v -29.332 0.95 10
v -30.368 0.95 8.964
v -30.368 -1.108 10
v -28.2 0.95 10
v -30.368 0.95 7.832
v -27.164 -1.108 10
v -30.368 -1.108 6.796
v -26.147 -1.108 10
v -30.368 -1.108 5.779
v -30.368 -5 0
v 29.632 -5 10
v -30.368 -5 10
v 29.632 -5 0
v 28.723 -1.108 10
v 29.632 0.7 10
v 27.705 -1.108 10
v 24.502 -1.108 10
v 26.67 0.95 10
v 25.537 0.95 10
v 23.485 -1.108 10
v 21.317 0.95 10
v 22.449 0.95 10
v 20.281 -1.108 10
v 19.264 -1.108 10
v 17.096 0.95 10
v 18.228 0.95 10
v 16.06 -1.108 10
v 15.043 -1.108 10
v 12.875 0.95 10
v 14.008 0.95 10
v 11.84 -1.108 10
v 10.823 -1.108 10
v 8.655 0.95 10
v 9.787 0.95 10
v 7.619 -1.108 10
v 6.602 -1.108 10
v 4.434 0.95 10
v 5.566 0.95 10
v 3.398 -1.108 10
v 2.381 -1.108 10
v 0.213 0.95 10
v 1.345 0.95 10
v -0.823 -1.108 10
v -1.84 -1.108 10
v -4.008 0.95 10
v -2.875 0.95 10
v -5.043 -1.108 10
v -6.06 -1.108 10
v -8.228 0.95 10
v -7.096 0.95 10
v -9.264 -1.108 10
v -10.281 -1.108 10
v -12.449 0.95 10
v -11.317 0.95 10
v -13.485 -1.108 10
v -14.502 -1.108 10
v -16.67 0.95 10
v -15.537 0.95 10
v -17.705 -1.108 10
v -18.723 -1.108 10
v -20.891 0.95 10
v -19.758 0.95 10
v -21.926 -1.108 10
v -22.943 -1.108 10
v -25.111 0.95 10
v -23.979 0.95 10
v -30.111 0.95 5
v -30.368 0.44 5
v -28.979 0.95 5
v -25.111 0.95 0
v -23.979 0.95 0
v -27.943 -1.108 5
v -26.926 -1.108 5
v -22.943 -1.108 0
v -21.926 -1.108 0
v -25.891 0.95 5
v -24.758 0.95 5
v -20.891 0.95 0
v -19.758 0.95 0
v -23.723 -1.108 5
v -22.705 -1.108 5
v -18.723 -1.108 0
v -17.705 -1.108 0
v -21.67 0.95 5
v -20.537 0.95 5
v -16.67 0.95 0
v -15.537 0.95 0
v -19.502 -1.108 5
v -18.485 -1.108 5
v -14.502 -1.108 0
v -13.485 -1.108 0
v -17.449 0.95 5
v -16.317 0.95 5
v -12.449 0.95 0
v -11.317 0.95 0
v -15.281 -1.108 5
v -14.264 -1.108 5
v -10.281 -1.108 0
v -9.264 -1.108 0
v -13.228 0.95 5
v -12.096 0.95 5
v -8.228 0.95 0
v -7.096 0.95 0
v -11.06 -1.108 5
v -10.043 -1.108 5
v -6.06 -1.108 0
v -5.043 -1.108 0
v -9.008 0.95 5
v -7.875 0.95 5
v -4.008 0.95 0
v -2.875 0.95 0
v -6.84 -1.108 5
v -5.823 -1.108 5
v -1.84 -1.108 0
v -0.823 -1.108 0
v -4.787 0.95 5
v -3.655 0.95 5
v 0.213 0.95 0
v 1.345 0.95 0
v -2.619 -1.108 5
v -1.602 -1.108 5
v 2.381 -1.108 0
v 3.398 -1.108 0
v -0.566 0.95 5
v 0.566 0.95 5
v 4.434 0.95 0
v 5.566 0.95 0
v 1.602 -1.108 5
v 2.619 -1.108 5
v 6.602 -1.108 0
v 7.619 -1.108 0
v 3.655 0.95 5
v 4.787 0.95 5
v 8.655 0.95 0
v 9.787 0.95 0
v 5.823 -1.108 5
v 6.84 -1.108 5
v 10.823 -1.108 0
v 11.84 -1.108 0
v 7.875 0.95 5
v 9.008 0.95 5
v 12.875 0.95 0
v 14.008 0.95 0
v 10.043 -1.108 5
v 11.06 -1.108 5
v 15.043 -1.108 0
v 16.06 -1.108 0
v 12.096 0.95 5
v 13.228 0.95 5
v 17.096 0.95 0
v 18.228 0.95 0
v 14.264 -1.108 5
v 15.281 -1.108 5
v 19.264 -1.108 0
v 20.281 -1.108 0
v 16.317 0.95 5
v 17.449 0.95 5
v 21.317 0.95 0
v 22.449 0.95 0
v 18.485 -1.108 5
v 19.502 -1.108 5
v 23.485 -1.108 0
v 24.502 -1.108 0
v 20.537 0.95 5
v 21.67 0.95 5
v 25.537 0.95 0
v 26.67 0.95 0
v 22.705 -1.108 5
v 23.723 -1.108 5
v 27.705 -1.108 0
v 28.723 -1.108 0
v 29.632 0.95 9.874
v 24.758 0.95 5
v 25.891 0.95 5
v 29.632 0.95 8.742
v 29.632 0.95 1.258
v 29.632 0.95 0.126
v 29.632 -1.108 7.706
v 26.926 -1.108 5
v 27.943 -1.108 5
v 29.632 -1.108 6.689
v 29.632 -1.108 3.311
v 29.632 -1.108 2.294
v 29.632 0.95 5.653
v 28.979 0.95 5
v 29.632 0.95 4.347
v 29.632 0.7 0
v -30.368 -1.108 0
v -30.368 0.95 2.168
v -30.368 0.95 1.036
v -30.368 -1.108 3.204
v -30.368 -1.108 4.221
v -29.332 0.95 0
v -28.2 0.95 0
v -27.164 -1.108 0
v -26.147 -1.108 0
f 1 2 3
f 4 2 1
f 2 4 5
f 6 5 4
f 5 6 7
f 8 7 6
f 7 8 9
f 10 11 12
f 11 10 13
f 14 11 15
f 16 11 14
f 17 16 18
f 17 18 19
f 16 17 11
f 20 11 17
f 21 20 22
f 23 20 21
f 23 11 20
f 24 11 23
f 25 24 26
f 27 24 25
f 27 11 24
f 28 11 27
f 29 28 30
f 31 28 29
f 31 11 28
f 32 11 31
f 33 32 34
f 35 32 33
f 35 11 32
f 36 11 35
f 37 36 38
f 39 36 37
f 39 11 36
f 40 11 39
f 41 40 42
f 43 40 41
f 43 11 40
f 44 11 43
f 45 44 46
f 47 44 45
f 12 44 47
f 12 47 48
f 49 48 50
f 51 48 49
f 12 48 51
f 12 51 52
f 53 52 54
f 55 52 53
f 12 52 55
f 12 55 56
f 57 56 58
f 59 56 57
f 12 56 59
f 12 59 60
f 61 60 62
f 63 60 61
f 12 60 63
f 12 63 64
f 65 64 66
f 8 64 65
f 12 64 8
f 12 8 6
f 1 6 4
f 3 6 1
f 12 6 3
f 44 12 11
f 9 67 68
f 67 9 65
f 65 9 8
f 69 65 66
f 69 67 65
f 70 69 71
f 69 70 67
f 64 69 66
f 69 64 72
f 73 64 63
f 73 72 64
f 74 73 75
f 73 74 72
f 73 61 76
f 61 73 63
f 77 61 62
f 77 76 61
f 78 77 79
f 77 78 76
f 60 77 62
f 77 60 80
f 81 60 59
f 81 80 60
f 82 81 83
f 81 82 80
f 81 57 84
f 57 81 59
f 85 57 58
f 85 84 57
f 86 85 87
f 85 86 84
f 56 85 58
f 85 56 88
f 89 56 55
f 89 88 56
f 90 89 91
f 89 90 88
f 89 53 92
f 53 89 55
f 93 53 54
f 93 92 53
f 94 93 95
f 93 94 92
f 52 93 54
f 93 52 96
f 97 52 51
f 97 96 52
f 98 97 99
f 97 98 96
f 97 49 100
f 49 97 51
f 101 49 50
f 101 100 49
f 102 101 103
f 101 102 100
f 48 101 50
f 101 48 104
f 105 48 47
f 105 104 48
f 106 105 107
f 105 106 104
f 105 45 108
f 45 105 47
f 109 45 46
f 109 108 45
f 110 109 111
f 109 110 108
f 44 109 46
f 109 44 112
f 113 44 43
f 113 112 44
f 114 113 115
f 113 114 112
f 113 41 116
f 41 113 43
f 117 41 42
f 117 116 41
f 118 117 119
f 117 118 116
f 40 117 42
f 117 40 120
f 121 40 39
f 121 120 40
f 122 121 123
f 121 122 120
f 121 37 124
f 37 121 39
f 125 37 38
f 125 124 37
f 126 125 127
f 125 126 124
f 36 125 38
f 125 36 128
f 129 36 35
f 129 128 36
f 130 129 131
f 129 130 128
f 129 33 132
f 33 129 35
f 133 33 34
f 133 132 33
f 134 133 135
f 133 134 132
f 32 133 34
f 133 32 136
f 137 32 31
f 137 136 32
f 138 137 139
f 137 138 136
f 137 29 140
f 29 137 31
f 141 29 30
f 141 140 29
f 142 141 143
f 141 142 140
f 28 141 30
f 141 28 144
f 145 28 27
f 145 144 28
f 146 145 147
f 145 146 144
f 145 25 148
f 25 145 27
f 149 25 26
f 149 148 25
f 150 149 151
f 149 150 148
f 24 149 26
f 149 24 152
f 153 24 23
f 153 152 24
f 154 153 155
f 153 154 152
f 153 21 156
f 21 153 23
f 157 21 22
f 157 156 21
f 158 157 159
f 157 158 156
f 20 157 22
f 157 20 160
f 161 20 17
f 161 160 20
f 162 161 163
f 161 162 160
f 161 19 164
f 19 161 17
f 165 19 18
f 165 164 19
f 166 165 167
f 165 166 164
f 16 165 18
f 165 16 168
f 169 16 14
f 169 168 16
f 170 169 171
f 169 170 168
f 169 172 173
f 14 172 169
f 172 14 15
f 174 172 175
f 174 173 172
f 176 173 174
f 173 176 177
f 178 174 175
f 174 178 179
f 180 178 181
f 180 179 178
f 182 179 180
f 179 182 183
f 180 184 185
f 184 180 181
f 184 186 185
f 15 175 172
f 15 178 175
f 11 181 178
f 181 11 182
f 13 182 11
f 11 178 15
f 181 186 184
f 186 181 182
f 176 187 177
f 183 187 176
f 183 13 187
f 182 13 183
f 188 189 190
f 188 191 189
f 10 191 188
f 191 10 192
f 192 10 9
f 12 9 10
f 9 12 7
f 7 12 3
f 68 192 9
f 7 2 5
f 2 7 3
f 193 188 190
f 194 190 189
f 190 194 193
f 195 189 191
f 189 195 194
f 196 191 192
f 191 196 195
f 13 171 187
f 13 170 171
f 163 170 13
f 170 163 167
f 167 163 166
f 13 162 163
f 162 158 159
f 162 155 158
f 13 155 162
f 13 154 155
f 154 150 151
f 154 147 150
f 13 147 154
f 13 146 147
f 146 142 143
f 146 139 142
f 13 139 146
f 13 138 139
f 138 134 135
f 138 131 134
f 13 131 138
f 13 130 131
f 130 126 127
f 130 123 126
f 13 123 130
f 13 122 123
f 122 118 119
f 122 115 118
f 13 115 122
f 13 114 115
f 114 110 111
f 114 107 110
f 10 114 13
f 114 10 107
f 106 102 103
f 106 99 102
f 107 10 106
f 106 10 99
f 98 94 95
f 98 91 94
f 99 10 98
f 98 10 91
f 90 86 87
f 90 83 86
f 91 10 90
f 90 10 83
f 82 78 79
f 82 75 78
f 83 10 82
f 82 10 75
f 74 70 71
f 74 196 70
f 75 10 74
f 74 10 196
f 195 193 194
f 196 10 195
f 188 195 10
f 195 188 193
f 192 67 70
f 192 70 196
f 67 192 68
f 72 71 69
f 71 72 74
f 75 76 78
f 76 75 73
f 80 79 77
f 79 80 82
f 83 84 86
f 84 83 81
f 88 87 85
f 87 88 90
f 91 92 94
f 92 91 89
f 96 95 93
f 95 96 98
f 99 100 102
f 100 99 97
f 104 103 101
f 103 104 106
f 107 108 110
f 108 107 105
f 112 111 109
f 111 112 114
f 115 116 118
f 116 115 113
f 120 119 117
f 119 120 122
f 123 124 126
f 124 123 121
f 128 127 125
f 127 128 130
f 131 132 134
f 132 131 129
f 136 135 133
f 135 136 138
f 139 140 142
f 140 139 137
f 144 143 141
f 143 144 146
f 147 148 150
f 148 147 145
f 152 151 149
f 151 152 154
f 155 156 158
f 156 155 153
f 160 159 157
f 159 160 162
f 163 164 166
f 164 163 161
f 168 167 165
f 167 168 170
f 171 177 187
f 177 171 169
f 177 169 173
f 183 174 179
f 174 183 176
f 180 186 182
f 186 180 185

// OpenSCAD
$fn = 96;

/* Library for Involute Gears, Screws and Racks

This library contains the following modules
- rack(modul, length, height, width, pressure_angle=20, helix_angle=0)
- spur_gear(modul, tooth_number, width, bore, pressure_angle=20, helix_angle=0, optimized=true)
- herringbone_gear(modul, tooth_number, width, bore, pressure_angle=20, helix_angle=0, optimized=true)
- rack_and_pinion (modul, rack_length, gear_teeth, rack_height, gear_bore, width, pressure_angle=20, helix_angle=0, together_built=true, optimized=true)
- ring_gear(modul, tooth_number, width, rim_width, pressure_angle=20, helix_angle=0)
- herringbone_ring_gear(modul, tooth_number, width, rim_width, pressure_angle=20, helix_angle=0)
- planetary_gear(modul, sun_teeth, planet_teeth, number_planets, width, rim_width, bore, pressure_angle=20, helix_angle=0, together_built=true, optimized=true)
- bevel_gear(modul, tooth_number,  partial_cone_angle, tooth_width, bore, pressure_angle=20, helix_angle=0)
- bevel_herringbone_gear(modul, tooth_number, partial_cone_angle, tooth_width, bore, pressure_angle=20, helix_angle=0)
- bevel_gear_pair(modul, gear_teeth, pinion_teeth, axis_angle=90, tooth_width, bore, pressure_angle = 20, helix_angle=0, together_built=true)
- bevel_herringbone_gear_pair(modul, gear_teeth, pinion_teeth, axis_angle=90, tooth_width, bore, pressure_angle = 20, helix_angle=0, together_built=true)
- worm(modul, thread_starts, length, bore, pressure_angle=20, lead_angle=10, together_built=true)
- worm_gear(modul, tooth_number, thread_starts, width, length, worm_bore, gear_bore, pressure_angle=20, lead_angle=0, optimized=true, together_built=true)

Examples of each module are commented out at the end of this file

Author:      Dr Jörg Janssen
Last Verified On:      1. June 2018
Version:    2.2
License:     Creative Commons - Attribution, Non Commercial, Share Alike

Permitted modules according to DIN 780:
0.05 0.06 0.08 0.10 0.12 0.16
0.20 0.25 0.3  0.4  0.5  0.6
0.7  0.8  0.9  1    1.25 1.5
2    2.5  3    4    5    6
8    10   12   16   20   25
32   40   50   60

*/


// General Variables
pi = 3.14159;
rad = 57.29578;
clearance = 0.05;   // clearance between teeth

/*  Converts Radians to Degrees */
function grad(pressure_angle) = pressure_angle*rad;

/*  Converts Degrees to Radians */
function radian(pressure_angle) = pressure_angle/rad;

/*  Converts 2D Polar Coordinates to Cartesian
    Format: radius, phi; phi = Angle to x-Axis on xy-Plane */
function polar_to_cartesian(polvect) = [
    polvect[0]*cos(polvect[1]),  
    polvect[0]*sin(polvect[1])
];

/*  Circle Involutes-Function:
    Returns the Polar Coordinates of an Involute Circle
    r = Radius of the Base Circle
    rho = Rolling-angle in Degrees */
function ev(r,rho) = [
    r/cos(rho),
    grad(tan(rho)-radian(rho))
];

/*  Sphere-Involutes-Function
    Returns the Azimuth Angle of an Involute Sphere
    theta0 = Polar Angle of the Cone, where the Cutting Edge of the Large Sphere unrolls the Involute
    theta = Polar Angle for which the Azimuth Angle of the Involute is to be calculated */
function sphere_ev(theta0,theta) = 1/sin(theta0)*acos(cos(theta)/cos(theta0))-acos(tan(theta0)/tan(theta));

/*  Converts Spherical Coordinates to Cartesian
    Format: radius, theta, phi; theta = Angle to z-Axis, phi = Angle to x-Axis on xy-Plane */
function sphere_to_cartesian(vect) = [
    vect[0]*sin(vect[1])*cos(vect[2]),  
    vect[0]*sin(vect[1])*sin(vect[2]),
    vect[0]*cos(vect[1])
];

/*  Check if a Number is even
    = 1, if so
    = 0, if the Number is not even */
function is_even(number) =
    (number == floor(number/2)*2) ? 1 : 0;

/*  greatest common Divisor
    according to Euclidean Algorithm.
    Sorting: a must be greater than b */
function ggt(a,b) = 
    a%b == 0 ? b : ggt(b,a%b);

/*  Polar function with polar angle and two variables */
function spiral(a, r0, phi) =
    a*phi + r0; 

/*  Copy and rotate a Body */
module copier(vect, number, distance, winkel){
    for(i = [0:number-1]){
        translate(v=vect*distance*i)
            rotate(a=i*winkel, v = [0,0,1])
                children(0);
    }
}

/*  rack
    modul = Height of the Tooth Tip above the Rolling LIne
    length = Length of the Rack
    height = Height of the Rack to the Pitch Line
    width = Width of a Tooth
    pressure_angle = Pressure Angle, Standard = 20° according to DIN 867. Should not exceed 45°.
    helix_angle = Helix Angle of the Rack Transverse Axis; 0° = Spur Teeth */
module rack(modul, length, height, width, pressure_angle = 20, helix_angle = 0) {

    // Dimension Calculations
    modul=modul*(1-clearance);
    c = modul / 6;                                              // Tip Clearance
    mx = modul/cos(helix_angle);                          // Module Shift by Helix Angle in the X-Direction
    a = 2*mx*tan(pressure_angle)+c*tan(pressure_angle);       // Flank Width
    b = pi*mx/2-2*mx*tan(pressure_angle);                      // Tip Width
    x = width*tan(helix_angle);                          // Topside Shift by Helix Angle in the X-Direction
    nz = ceil((length+abs(2*x))/(pi*mx));                       // Number of Teeth
    
    translate([-pi*mx*(nz-1)/2-a-b/2,-modul,0]){
        intersection(){                                         // Creates a Prism that fits into a Geometric Box
            copier([1,0,0], nz, pi*mx, 0){
                polyhedron(
                    points=[[0,-c,0], [a,2*modul,0], [a+b,2*modul,0], [2*a+b,-c,0], [pi*mx,-c,0], [pi*mx,modul-height,0], [0,modul-height,0], // Underside
                        [0+x,-c,width], [a+x,2*modul,width], [a+b+x,2*modul,width], [2*a+b+x,-c,width], [pi*mx+x,-c,width], [pi*mx+x,modul-height,width], [0+x,modul-height,width]],   // Topside
                    faces=[[6,5,4,3,2,1,0],                     // Underside
                        [1,8,7,0],
                        [9,8,1,2],
                        [10,9,2,3],
                        [11,10,3,4],
                        [12,11,4,5],
                        [13,12,5,6],
                        [7,13,6,0],
                        [7,8,9,10,11,12,13],                    // Topside
                    ]
                );
            };
            translate([abs(x),-height+modul-0.5,-0.5]){
                cube([length,height+modul+1,width+1]);          // Cuboid which includes the Volume of the Rack
            }   
        };
    };  
}

/*  Spur gear
    modul = Height of the Tooth Tip beyond the Pitch Circle
    tooth_number = Number of Gear Teeth
    width = tooth_width
    bore = Diameter of the Center Hole
    pressure_angle = Pressure Angle, Standard = 20° according to DIN 867. Should not exceed 45°.
    helix_angle = Helix Angle to the Axis of Rotation; 0° = Spur Teeth
    optimized = Create holes for Material-/Weight-Saving or Surface Enhancements where Geometry allows */
module spur_gear(modul, tooth_number, width, bore, pressure_angle = 20, helix_angle = 0, optimized = true) {

    // Dimension Calculations  
    d = modul * tooth_number;                                           // Pitch Circle Diameter
    r = d / 2;                                                      // Pitch Circle Radius
    alpha_spur = atan(tan(pressure_angle)/cos(helix_angle));// Helix Angle in Transverse Section
    db = d * cos(alpha_spur);                                      // Base Circle Diameter
    rb = db / 2;                                                    // Base Circle Radius
    da = (modul <1)? d + modul * 2.2 : d + modul * 2;               // Tip Diameter according to DIN 58400 or DIN 867
    ra = da / 2;                                                    // Tip Circle Radius
    c =  (tooth_number <3)? 0 : modul/6;                                // Tip Clearance
    df = d - 2 * (modul + c);                                       // Root Circle Diameter
    rf = df / 2;                                                    // Root Radius
    rho_ra = acos(rb/ra);                                           // Maximum Rolling Angle;
                                                                    // Involute begins on the Base Circle and ends at the Tip Circle
    rho_r = acos(rb/r);                                             // Rolling Angle at Pitch Circle;
                                                                    // Involute begins on the Base Circle and ends at the Tip Circle
    phi_r = grad(tan(rho_r)-radian(rho_r));                         // Angle to Point of Involute on Pitch Circle
    gamma = rad*width/(r*tan(90-helix_angle));               // Torsion Angle for Extrusion
    step = rho_ra/16;                                            // Involute is divided into 16 pieces
    tau = 360/tooth_number;                                             // Pitch Angle
    
    r_hole = (2*rf - bore)/8;                                    // Radius of Holes for Material-/Weight-Saving
    rm = bore/2+2*r_hole;                                        // Distance of the Axes of the Holes from the Main Axis
    z_hole = floor(2*pi*rm/(3*r_hole));                             // Number of Holes for Material-/Weight-Saving
    
    optimized = (optimized && r >= width*1.5 && d > 2*bore);    // is Optimization useful?

    // Drawing
    union(){
        rotate([0,0,-phi_r-90*(1-clearance)/tooth_number]){                     // Center Tooth on X-Axis;
                                                                        // Makes Alignment with other Gears easier

            linear_extrude(height = width, twist = gamma){
                difference(){
                    union(){
                        tooth_width = (180*(1-clearance))/tooth_number+2*phi_r;
                        circle(rf);                                     // Root Circle 
                        for (rot = [0:tau:360]){
                            rotate (rot){                               // Copy and Rotate "Number of Teeth"
                                polygon(concat(                         // Tooth
                                    [[0,0]],                            // Tooth Segment starts and ends at Origin
                                    [for (rho = [0:step:rho_ra])     // From zero Degrees (Base Circle)
                                                                        // To Maximum Involute Angle (Tip Circle)
                                        polar_to_cartesian(ev(rb,rho))],       // First Involute Flank

                                    [polar_to_cartesian(ev(rb,rho_ra))],       // Point of Involute on Tip Circle

                                    [for (rho = [rho_ra:-step:0])    // of Maximum Involute Angle (Tip Circle)
                                                                        // to zero Degrees (Base Circle)
                                        polar_to_cartesian([ev(rb,rho)[0], tooth_width-ev(rb,rho)[1]])]
                                                                        // Second Involute Flank
                                                                        // (180*(1-clearance)) instead of 180 Degrees,
                                                                        // to allow clearance of the Flanks
                                    )
                                );
                            }
                        }
                    }           
                    circle(r = rm+r_hole*1.49);                         // "bore"
                }
            }
        }
        // with Material Savings
        if (optimized) {
            linear_extrude(height = width){
                difference(){
                        circle(r = (bore+r_hole)/2);
                        circle(r = bore/2);                          // bore
                    }
                }
            linear_extrude(height = (width-r_hole/2 < width*2/3) ? width*2/3 : width-r_hole/2){
                difference(){
                    circle(r=rm+r_hole*1.51);
                    union(){
                        circle(r=(bore+r_hole)/2);
                        for (i = [0:1:z_hole]){
                            translate(sphere_to_cartesian([rm,90,i*360/z_hole]))
                                circle(r = r_hole);
                        }
                    }
                }
            }
        }
        // without Material Savings
        else {
            linear_extrude(height = width){
                difference(){
                    circle(r = rm+r_hole*1.51);
                    circle(r = bore/2);
                }
            }
        }
    }
}

/* Herringbone_rack; uses the module "rack"
    modul = Height of the Tooth Tip above the Rolling LIne
    length = Length of the Rack
    height = Height of the Rack to the Pitch Line
    width = Width of a Tooth
    pressure_angle = Pressure Angle, Standard = 20° according to DIN 867. Should not exceed 45°.
    helix_angle = Helix Angle of the Rack Transverse Axis; 0° = Spur Teeth */
module herringbone_rack(modul, length, height, width, pressure_angle = 20, helix_angle) {
 width = width/2;
 translate([0,0,width]){
        union(){
            rack(modul, length, height, width, pressure_angle, helix_angle);      // bottom Half
            mirror([0,0,1]){
                rack(modul, length, height, width, pressure_angle, helix_angle);  // top Half
            }
        }
    }
}

/* Herringbone_gear; uses the module "spur_gear"
    modul = Height of the Tooth Tip beyond the Pitch Circle
    tooth_number = Number of Gear Teeth
    width = tooth_width
    bore = Diameter of the Center Hole
    pressure_angle = Pressure Angle, Standard = 20° according to DIN 867. Should not exceed 45°.
    helix_angle = Helix Angle to the Axis of Rotation, Standard = 0° (Spur Teeth)
    optimized = Holes for Material-/Weight-Saving */
module herringbone_gear(modul, tooth_number, width, bore, pressure_angle = 20, helix_angle=0, optimized=true){

    width = width/2;
    d = modul * tooth_number;                                           // Pitch Circle Diameter
    r = d / 2;                                                      // Pitch Circle Radius
    c =  (tooth_number <3)? 0 : modul/6;                                // Tip Clearance

    df = d - 2 * (modul + c);                                       // Root Circle Diameter
    rf = df / 2;                                                    // Root Radius

    r_hole = (2*rf - bore)/8;                                    // Radius of Holes for Material-/Weight-Saving
    rm = bore/2+2*r_hole;                                        // Distance of the Axes of the Holes from the Main Axis
    z_hole = floor(2*pi*rm/(3*r_hole));                             // Number of Holes for Material-/Weight-Saving
    
    optimized = (optimized && r >= width*3 && d > 2*bore);      // is Optimization useful?

    translate([0,0,width]){
        union(){
            spur_gear(modul, tooth_number, width, 2*(rm+r_hole*1.49), pressure_angle, helix_angle, false);      // bottom Half
            mirror([0,0,1]){
                spur_gear(modul, tooth_number, width, 2*(rm+r_hole*1.49), pressure_angle, helix_angle, false);  // top Half
            }
        }
    }
    // with Material Savings
    if (optimized) {
        linear_extrude(height = width*2){
            difference(){
                    circle(r = (bore+r_hole)/2);
                    circle(r = bore/2);                          // bore
                }
            }
        linear_extrude(height = (2*width-r_hole/2 < 1.33*width) ? 1.33*width : 2*width-r_hole/2){ //width*4/3
            difference(){
                circle(r=rm+r_hole*1.51);
                union(){
                    circle(r=(bore+r_hole)/2);
                    for (i = [0:1:z_hole]){
                        translate(sphere_to_cartesian([rm,90,i*360/z_hole]))
                            circle(r = r_hole);
                    }
                }
            }
        }
    }
    // without Material Savings
    else {
        linear_extrude(height = width*2){
            difference(){
                circle(r = rm+r_hole*1.51);
                circle(r = bore/2);
            }
        }
    }
}

/*  Rack and Pinion
    modul = Height of the Tooth Tip beyond the Pitch Circle
    rack_length = Length of the Rack
    gear_teeth = Number of Gear Teeth
    rack_height = Height of the Rack to the Pitch Line
    gear_bore = Diameter of the Center Hole of the Spur Gear
    width = Width of a Tooth
    pressure_angle = Pressure Angle, Standard = 20° according to DIN 867. Should not exceed 45°.
    helix_angle = Helix Angle to the Axis of Rotation, Standard = 0° (Spur Teeth) */
module rack_and_pinion (modul, rack_length, gear_teeth, rack_height, gear_bore, width, pressure_angle=20, helix_angle=0, together_built=true, optimized=true) {

    distance = together_built? modul*gear_teeth/2 : modul*gear_teeth;

    rack(modul, rack_length, rack_height, width, pressure_angle, -helix_angle);
    translate([0,distance,0])
        rotate(a=360/gear_teeth)
            spur_gear (modul, gear_teeth, width, gear_bore, pressure_angle, helix_angle, optimized);
}

/*  Ring gear
    modul = Height of the Tooth Tip beyond the Pitch Circle
    tooth_number = Number of Gear Teeth
    width = tooth_width
    rim_width = Width of the Rim from the Root Circle
    bore = Diameter of the Center Hole
    pressure_angle = Pressure Angle, Standard = 20° according to DIN 867. Should not exceed 45°.
    helix_angle = Helix Angle to the Axis of Rotation, Standard = 0° (Spur Teeth) */
module ring_gear(modul, tooth_number, width, rim_width, pressure_angle = 20, helix_angle = 0) {

    // Dimension Calculations  
    ha = (tooth_number >= 20) ? 0.02 * atan((tooth_number/15)/pi) : 0.6;    // Shortening Factor of Tooth Head Height
    d = modul * tooth_number;                                           // Pitch Circle Diameter
    r = d / 2;                                                      // Pitch Circle Radius
    alpha_spur = atan(tan(pressure_angle)/cos(helix_angle));// Helix Angle in Transverse Section
    db = d * cos(alpha_spur);                                      // Base Circle Diameter
    rb = db / 2;                                                    // Base Circle Radius
    c = modul / 6;                                                  // Tip Clearance
    da = (modul <1)? d + (modul+c) * 2.2 : d + (modul+c) * 2;       // Tip Diameter
    ra = da / 2;                                                    // Tip Circle Radius
    //df = d - 2 * modul * ha;                                        // Root Circle Diameter
	//Modified by Eduardo Foltran 2023-03-19
	df = d - 2 * modul; 
    rf = df / 2;                                                    // Root Radius
    rho_ra = acos(rb/ra);                                           // Maximum Involute Angle;
                                                                    // Involute begins on the Base Circle and ends at the Tip Circle
    rho_r = acos(rb/r);                                             // Involute Angle at Pitch Circle;
                                                                    // Involute begins on the Base Circle and ends at the Tip Circle
    phi_r = grad(tan(rho_r)-radian(rho_r));                         // Angle to Point of Involute on Pitch Circle
    gamma = rad*width/(r*tan(90-helix_angle));               // Torsion Angle for Extrusion
    step = rho_ra/16;                                            // Involute is divided into 16 pieces
    tau = 360/tooth_number;                                             // Pitch Angle

    // Drawing
    rotate([0,0,-phi_r-90*(1+clearance)/tooth_number])                      // Center Tooth on X-Axis;
                                                                    // Makes Alignment with other Gears easier
    linear_extrude(height = width, twist = gamma){
        difference(){
            circle(r = ra + rim_width);                            // Outer Circle
            union(){
                tooth_width = (180*(1+clearance))/tooth_number+2*phi_r;
                circle(rf);                                         // Root Circle 
                for (rot = [0:tau:360]){
                    rotate (rot) {                                  // Copy and Rotate "Number of Teeth"
                        polygon( concat(
                            [[0,0]],
                            [for (rho = [0:step:rho_ra])         // From zero Degrees (Base Circle)
                                                                    // to Maximum Involute Angle (Tip Circle)
                                polar_to_cartesian(ev(rb,rho))],
                            [polar_to_cartesian(ev(rb,rho_ra))],
                            [for (rho = [rho_ra:-step:0])        // von Maximum Involute Angle (Kopfkreis)
                                                                    // to zero Degrees (Base Circle)
                                polar_to_cartesian([ev(rb,rho)[0], tooth_width-ev(rb,rho)[1]])]
                                                                    // (180*(1+clearance)) statt 180,
                                                                    // to allow clearance of the Flanks
                            )
                        );
                    }
                }
            }
        }
    }

    echo("Ring Gear Outer Diamater = ", 2*(ra + rim_width));
    
}

/*  Herringbone Ring Gear; uses the Module "ring_gear"
    modul = Height of the Tooth Tip over the Partial Cone
    tooth_number = Number of Gear Teeth
    width = tooth_width
    bore = Diameter of the Center Hole
    pressure_angle = Pressure Angle, Standard = 20° according to DIN 867. Should not exceed 45°.
    helix_angle = Helix Angle to the Axis of Rotation, Standard = 0° (Spur Teeth) */
module herringbone_ring_gear(modul, tooth_number, width, rim_width, pressure_angle = 20, helix_angle = 0) {

    width = width / 2;
    translate([0,0,width])
        union(){
        ring_gear(modul, tooth_number, width, rim_width, pressure_angle, helix_angle);       // bottom Half
        mirror([0,0,1])
            ring_gear(modul, tooth_number, width, rim_width, pressure_angle, helix_angle);   // top Half
    }
}

/*  Planetary Gear; uses the Modules "herringbone_gear" and "herringbone_ring_gear"
    modul = Height of the Tooth Tip over the Partial Cone
    sun_teeth = Number of Teeth of the Sun Gear
    planet_teeth = Number of Teeth of a Planet Gear
    number_planets = Number of Planet Gears. If null, the Function will calculate the Minimum Number
    width = tooth_width
    rim_width = Width of the Rim from the Root Circle
    bore = Diameter of the Center Hole
    pressure_angle = Pressure Angle, Standard = 20° according to DIN 867. Should not exceed 45°.
    helix_angle = Helix Angle to the Axis of Rotation, Standard = 0° (Spur Teeth)
    together_built = 
    optimized = Create holes for Material-/Weight-Saving or Surface Enhancements where Geometry allows
    together_built = Components assembled for Construction or separated for 3D-Printing */
module planetary_gear(modul, sun_teeth, planet_teeth, number_planets, width, rim_width, bore, pressure_angle=20, helix_angle=0, together_built=true, optimized=true){

    // Dimension Calculations
    d_sun = modul*sun_teeth;                                     // Sun Pitch Circle Diameter
    d_planet = modul*planet_teeth;                                   // Planet Pitch Circle Diameter
    center_distance = modul*(sun_teeth +  planet_teeth) / 2;        // Distance from Sun- or Ring-Gear Axis to Planet Axis
    ring_teeth = sun_teeth + 2*planet_teeth;              // Number of Teeth of the Ring Gear
    d_ring = modul*ring_teeth;                                 // Ring Pitch Circle Diameter

    rotate = is_even(planet_teeth);                                // Does the Sun Gear need to be rotated?
        
    n_max = floor(180/asin(modul*(planet_teeth)/(modul*(sun_teeth +  planet_teeth))));
                                                                        // Number of Planet Gears: at most as many as possible without overlap

    // Drawing
    rotate([0,0,180/sun_teeth*rotate]){
        herringbone_gear (modul, sun_teeth, width, bore, pressure_angle, -helix_angle, optimized);      // Sun Gear
    }

    if (together_built){
        if(number_planets==0){
            list = [ for (n=[2 : 1 : n_max]) if ((((ring_teeth+sun_teeth)/n)==floor((ring_teeth+sun_teeth)/n))) n];
            number_planets = list[0];                                      // Determine Number of Planet Gears
             center_distance = modul*(sun_teeth + planet_teeth)/2;      // Distance from Sun- / Ring-Gear Axis
            for(n=[0:1:number_planets-1]){
                translate(sphere_to_cartesian([center_distance,90,360/number_planets*n]))
                    rotate([0,0,n*360*d_sun/d_planet])
                        herringbone_gear (modul, planet_teeth, width, bore, pressure_angle, helix_angle); // Planet Gears
            }
       }
       else{
            center_distance = modul*(sun_teeth + planet_teeth)/2;       // Distance from Sun- / Ring-Gear Axis
            for(n=[0:1:number_planets-1]){
                translate(sphere_to_cartesian([center_distance,90,360/number_planets*n]))
                rotate([0,0,n*360*d_sun/(d_planet)])
                    herringbone_gear (modul, planet_teeth, width, bore, pressure_angle, helix_angle); // Planet Gears
            }
        }
    }
    else{
        planet_distance = ring_teeth*modul/2+rim_width+d_planet;     // Distance between Planets
        for(i=[-(number_planets-1):2:(number_planets-1)]){
            translate([planet_distance, d_planet*i,0])
                herringbone_gear (modul, planet_teeth, width, bore, pressure_angle, helix_angle); // Planet Gears
        }
    }

    herringbone_ring_gear (modul, ring_teeth, width, rim_width, pressure_angle, helix_angle); // Ring Gear

}

/*  Bevel Gear
    modul = Height of the Tooth Tip over the Partial Cone; Specification for the Outside of the Cone
    tooth_number = Number of Gear Teeth
    partial_cone_angle = (Half)angle of the Cone on which the other Ring Gear rolls
    tooth_width = Width of the Teeth from the Outside toward the apex of the Cone
    bore = Diameter of the Center Hole
    pressure_angle = Pressure Angle, Standard = 20° according to DIN 867. Should not exceed 45°.
    helix_angle = Helix Angle, Standard = 0° */
module bevel_gear(modul, tooth_number, partial_cone_angle, tooth_width, bore, pressure_angle = 20, helix_angle=0) {

    // Dimension Calculations
    d_outside = modul * tooth_number;                                    // Part Cone Diameter at the Cone Base,
                                                                    // corresponds to the Chord in a Spherical Section
    r_outside = d_outside / 2;                                        // Part Cone Radius at the Cone Base
    rg_outside = r_outside/sin(partial_cone_angle);                      // Large-Cone Radius for Outside-Tooth, corresponds to the Length of the Cone-Flank;
    rg_inside = rg_outside - tooth_width;                              // Large-Cone Radius for Inside-Tooth  
    r_inside = r_outside*rg_inside/rg_outside;
    alpha_spur = atan(tan(pressure_angle)/cos(helix_angle));// Helix Angle in Transverse Section
    delta_b = asin(cos(alpha_spur)*sin(partial_cone_angle));          // Base Cone Angle     
    da_outside = (modul <1)? d_outside + (modul * 2.2) * cos(partial_cone_angle): d_outside + modul * 2 * cos(partial_cone_angle);
    ra_outside = da_outside / 2;
    delta_a = asin(ra_outside/rg_outside);
    c = modul / 6;                                                  // Tip Clearance
    df_outside = d_outside - (modul +c) * 2 * cos(partial_cone_angle);
    rf_outside = df_outside / 2;
    delta_f = asin(rf_outside/rg_outside);
    rkf = rg_outside*sin(delta_f);                                   // Radius of the Cone Foot
    height_f = rg_outside*cos(delta_f);                               // Height of the Cone from the Root Cone
    
    echo("Part Cone Diameter at the Cone Base = ", d_outside);
    
    // Sizes for Complementary Truncated Cone
    height_k = (rg_outside-tooth_width)/cos(partial_cone_angle);          // Height of the Complementary Cone for corrected Tooth Length
    rk = (rg_outside-tooth_width)/sin(partial_cone_angle);               // Foot Radius of the Complementary Cone
    rfk = rk*height_k*tan(delta_f)/(rk+height_k*tan(delta_f));        // Tip Radius of the Cylinders for 
                                                                    // Complementary Truncated Cone
    height_fk = rk*height_k/(height_k*tan(delta_f)+rk);                // height of the Complementary Truncated Cones

    echo("Bevel Gear Height = ", height_f-height_fk);
    
    phi_r = sphere_ev(delta_b, partial_cone_angle);                      // Angle to Point of Involute on Partial Cone
        
    // Torsion Angle gamma from Helix Angle
    gamma_g = 2*atan(tooth_width*tan(helix_angle)/(2*rg_outside-tooth_width));
    gamma = 2*asin(rg_outside/r_outside*sin(gamma_g/2));
    
    step = (delta_a - delta_b)/16;
    tau = 360/tooth_number;                                             // Pitch Angle
    start = (delta_b > delta_f) ? delta_b : delta_f;
    mirrpoint = (180*(1-clearance))/tooth_number+2*phi_r;

    // Drawing
    rotate([0,0,phi_r+90*(1-clearance)/tooth_number]){                      // Center Tooth on X-Axis;
                                                                    // Makes Alignment with other Gears easier
        translate([0,0,height_f]) rotate(a=[0,180,0]){
            union(){
                translate([0,0,height_f]) rotate(a=[0,180,0]){                               // Truncated Cone                          
                    difference(){
                        linear_extrude(height=height_f-height_fk, scale=rfk/rkf) circle(rkf*1.001); // 1 permille Overlap with Tooth Root
                        translate([0,0,-1]){
                            cylinder(h = height_f-height_fk+2, r = bore/2);                // bore
                        }
                    }   
                }
                for (rot = [0:tau:360]){
                    rotate (rot) {                                                          // Copy and Rotate "Number of Teeth"
                        union(){
                            if (delta_b > delta_f){
                                // Tooth Root
                                flankpoint_under = 1*mirrpoint;
                                flankpoint_over = sphere_ev(delta_f, start);
                                polyhedron(
                                    points = [
                                        sphere_to_cartesian([rg_outside, start*1.001, flankpoint_under]),    // 1 permille Overlap with Tooth
                                        sphere_to_cartesian([rg_inside, start*1.001, flankpoint_under+gamma]),
                                        sphere_to_cartesian([rg_inside, start*1.001, mirrpoint-flankpoint_under+gamma]),
                                        sphere_to_cartesian([rg_outside, start*1.001, mirrpoint-flankpoint_under]),                               
                                        sphere_to_cartesian([rg_outside, delta_f, flankpoint_under]),
                                        sphere_to_cartesian([rg_inside, delta_f, flankpoint_under+gamma]),
                                        sphere_to_cartesian([rg_inside, delta_f, mirrpoint-flankpoint_under+gamma]),
                                        sphere_to_cartesian([rg_outside, delta_f, mirrpoint-flankpoint_under])                                
                                    ],
                                    faces = [[0,1,2],[0,2,3],[0,4,1],[1,4,5],[1,5,2],[2,5,6],[2,6,3],[3,6,7],[0,3,7],[0,7,4],[4,6,5],[4,7,6]],
                                    convexity =1
                                );
                            }
                            // Tooth
                            for (delta = [start:step:delta_a-step]){
                                flankpoint_under = sphere_ev(delta_b, delta);
                                flankpoint_over = sphere_ev(delta_b, delta+step);
                                polyhedron(
                                    points = [
                                        sphere_to_cartesian([rg_outside, delta, flankpoint_under]),
                                        sphere_to_cartesian([rg_inside, delta, flankpoint_under+gamma]),
                                        sphere_to_cartesian([rg_inside, delta, mirrpoint-flankpoint_under+gamma]),
                                        sphere_to_cartesian([rg_outside, delta, mirrpoint-flankpoint_under]),                             
                                        sphere_to_cartesian([rg_outside, delta+step, flankpoint_over]),
                                        sphere_to_cartesian([rg_inside, delta+step, flankpoint_over+gamma]),
                                        sphere_to_cartesian([rg_inside, delta+step, mirrpoint-flankpoint_over+gamma]),
                                        sphere_to_cartesian([rg_outside, delta+step, mirrpoint-flankpoint_over])                                   
                                    ],
                                    faces = [[0,1,2],[0,2,3],[0,4,1],[1,4,5],[1,5,2],[2,5,6],[2,6,3],[3,6,7],[0,3,7],[0,7,4],[4,6,5],[4,7,6]],
                                    convexity =1
                                );
                            }
                        }
                    }
                }   
            }
        }
    }
}

/*  Bevel Herringbone Gear; uses the Module "bevel_gear"
    modul = Height of the Tooth Tip beyond the Pitch Circle
    tooth_number = Number of Gear Teeth
    partial_cone_angle, tooth_width
    bore = Diameter of the Center Hole
    pressure_angle = Pressure Angle, Standard = 20° according to DIN 867. Should not exceed 45°.
    helix_angle = Helix Angle, Standard = 0° */
module bevel_herringbone_gear(modul, tooth_number, partial_cone_angle, tooth_width, bore, pressure_angle = 20, helix_angle=0){

    // Dimension Calculations
    
    tooth_width = tooth_width / 2;
    
    d_outside = modul * tooth_number;                                // Part Cone Diameter at the Cone Base,
                                                                // corresponds to the Chord in a Spherical Section
    r_outside = d_outside / 2;                                    // Part Cone Radius at the Cone Base
    rg_outside = r_outside/sin(partial_cone_angle);                  // Large-Cone Radius, corresponds to the Length of the Cone-Flank;
    c = modul / 6;                                              // Tip Clearance
    df_outside = d_outside - (modul +c) * 2 * cos(partial_cone_angle);
    rf_outside = df_outside / 2;
    delta_f = asin(rf_outside/rg_outside);
    height_f = rg_outside*cos(delta_f);                           // Height of the Cone from the Root Cone

    // Torsion Angle gamma from Helix Angle
    gamma_g = 2*atan(tooth_width*tan(helix_angle)/(2*rg_outside-tooth_width));
    gamma = 2*asin(rg_outside/r_outside*sin(gamma_g/2));
    
    echo("Part Cone Diameter at the Cone Base = ", d_outside);
    
    // Sizes for Complementary Truncated Cone
    height_k = (rg_outside-tooth_width)/cos(partial_cone_angle);      // Height of the Complementary Cone for corrected Tooth Length
    rk = (rg_outside-tooth_width)/sin(partial_cone_angle);           // Foot Radius of the Complementary Cone
    rfk = rk*height_k*tan(delta_f)/(rk+height_k*tan(delta_f));    // Tip Radius of the Cylinders for 
                                                                // Complementary Truncated Cone
    height_fk = rk*height_k/(height_k*tan(delta_f)+rk);            // height of the Complementary Truncated Cones
    
    modul_inside = modul*(1-tooth_width/rg_outside);

        union(){
        bevel_gear(modul, tooth_number, partial_cone_angle, tooth_width, bore, pressure_angle, helix_angle);        // bottom Half
        translate([0,0,height_f-height_fk])
            rotate(a=-gamma,v=[0,0,1])
                bevel_gear(modul_inside, tooth_number, partial_cone_angle, tooth_width, bore, pressure_angle, -helix_angle); // top Half
    }
}

/*  Spiral Bevel Gear; uses the Module "bevel_gear"
    modul = Height of the Tooth Tip beyond the Pitch Circle
    tooth_number = Number of Gear Teeth
    height = Height of Gear Teeth
    bore = Diameter of the Center Hole
    pressure_angle = Pressure Angle, Standard = 20° according to DIN 867. Should not exceed 45°.
    helix_angle = Helix Angle, Standard = 0° */
module spiral_bevel_gear(modul, tooth_number, partial_cone_angle, tooth_width, bore, pressure_angle = 20, helix_angle=30){

    steps = 16;

    // Dimension Calculations
    
    b = tooth_width / steps;  
    d_outside = modul * tooth_number;                                // Part Cone Diameter at the Cone Base,
                                                                // corresponds to the Chord in a Spherical Section
    r_outside = d_outside / 2;                                    // Part Cone Radius at the Cone Base
    rg_outside = r_outside/sin(partial_cone_angle);                  // Large-Cone Radius, corresponds to the Length of the Cone-Flank;
    rg_center = rg_outside-tooth_width/2;

    echo("Part Cone Diameter at the Cone Base = ", d_outside);

    a=tan(helix_angle)/rg_center;
    
    union(){
    for(i=[0:1:steps-1]){
        r = rg_outside-i*b;
        helix_angle = a*r;
        modul_r = modul-b*i/rg_outside;
        translate([0,0,b*cos(partial_cone_angle)*i])
            
            rotate(a=-helix_angle*i,v=[0,0,1])
                bevel_gear(modul_r, tooth_number, partial_cone_angle, b, bore, pressure_angle, helix_angle);   // top Half
        }
    }
}

/*  Bevel Gear Pair with any axis_angle; uses the Module "bevel_gear"
    modul = Height of the Tooth Tip over the Partial Cone; Specification for the Outside of the Cone
    gear_teeth = Number of Gear Teeth on the Gear
    pinion_teeth = Number of Gear Teeth on the Pinion
    axis_angle = Angle between the Axles of the Gear and Pinion
    tooth_width = Width of the Teeth from the Outside toward the apex of the Cone
    gear_bore = Diameter of the Center Hole of the Gear
    pinion_bore = Diameter of the Center Bore of the Gear
    pressure_angle = Pressure Angle, Standard = 20° according to DIN 867. Should not exceed 45°.
    helix_angle = Helix Angle, Standard = 0°
    together_built = Components assembled for Construction or separated for 3D-Printing */
module bevel_gear_pair(modul, gear_teeth, pinion_teeth, axis_angle=90, tooth_width, gear_bore, pinion_bore, pressure_angle=20, helix_angle=0, together_built=true){
 
    // Dimension Calculations
    r_gear = modul*gear_teeth/2;                           // Cone Radius of the Gear
    delta_gear = atan(sin(axis_angle)/(pinion_teeth/gear_teeth+cos(axis_angle)));   // Cone Angle of the Gear
    delta_pinion = atan(sin(axis_angle)/(gear_teeth/pinion_teeth+cos(axis_angle)));// Cone Angle of the Pinion
    rg = r_gear/sin(delta_gear);                              // Radius of the Large Sphere
    c = modul / 6;                                          // Tip Clearance
    df_pinion = pi*rg*delta_pinion/90 - 2 * (modul + c);    // Bevel Diameter on the Large Sphere 
    rf_pinion = df_pinion / 2;                              // Root Cone Radius on the Large Sphere
    delta_f_pinion = rf_pinion/(pi*rg) * 180;               // Tip Cone Angle
    rkf_pinion = rg*sin(delta_f_pinion);                    // Radius of the Cone Foot
    height_f_pinion = rg*cos(delta_f_pinion);                // Height of the Cone from the Root Cone
    
    echo("Cone Angle Gear = ", delta_gear);
    echo("Cone Angle Pinion = ", delta_pinion);
 
    df_gear = pi*rg*delta_gear/90 - 2 * (modul + c);          // Bevel Diameter on the Large Sphere 
    rf_gear = df_gear / 2;                                    // Root Cone Radius on the Large Sphere
    delta_f_gear = rf_gear/(pi*rg) * 180;                     // Tip Cone Angle
    rkf_gear = rg*sin(delta_f_gear);                          // Radius of the Cone Foot
    height_f_gear = rg*cos(delta_f_gear);                      // Height of the Cone from the Root Cone

    echo("Gear Height = ", height_f_gear);
    echo("Pinion Height = ", height_f_pinion);
    
    rotate = is_even(pinion_teeth);
    
    // Drawing
    // Rad
    rotate([0,0,180*(1-clearance)/gear_teeth*rotate])
        bevel_gear(modul, gear_teeth, delta_gear, tooth_width, gear_bore, pressure_angle, helix_angle);
    
    // Ritzel
    if (together_built)
        translate([-height_f_pinion*cos(90-axis_angle),0,height_f_gear-height_f_pinion*sin(90-axis_angle)])
            rotate([0,axis_angle,0])
                bevel_gear(modul, pinion_teeth, delta_pinion, tooth_width, pinion_bore, pressure_angle, -helix_angle);
    else
        translate([rkf_pinion*2+modul+rkf_gear,0,0])
            bevel_gear(modul, pinion_teeth, delta_pinion, tooth_width, pinion_bore, pressure_angle, -helix_angle);
 }

/*  Herringbone Bevel Gear Pair with arbitrary axis_angle; uses the Module "bevel_herringbone_gear"
    modul = Height of the Tooth Tip over the Partial Cone; Specification for the Outside of the Cone
    gear_teeth = Number of Gear Teeth on the Gear
    pinion_teeth = Number of Gear Teeth on the Pinion
    axis_angle = Angle between the Axles of the Gear and Pinion
    tooth_width = Width of the Teeth from the Outside toward the apex of the Cone
    gear_bore = Diameter of the Center Hole of the Gear
    pinion_bore = Diameter of the Center Bore of the Gear
    pressure_angle = Pressure Angle, Standard = 20° according to DIN 867. Should not exceed 45°.
    helix_angle = Helix Angle, Standard = 0°
    together_built = Components assembled for Construction or separated for 3D-Printing */
module bevel_herringbone_gear_pair(modul, gear_teeth, pinion_teeth, axis_angle=90, tooth_width, gear_bore, pinion_bore, pressure_angle = 20, helix_angle=10, together_built=true){
 
    r_gear = modul*gear_teeth/2;                           // Cone Radius of the Gear
    delta_gear = atan(sin(axis_angle)/(pinion_teeth/gear_teeth+cos(axis_angle)));   // Cone Angle of the Gear
    delta_pinion = atan(sin(axis_angle)/(gear_teeth/pinion_teeth+cos(axis_angle)));// Cone Angle of the Pinion
    rg = r_gear/sin(delta_gear);                              // Radius of the Large Sphere
    c = modul / 6;                                          // Tip Clearance
    df_pinion = pi*rg*delta_pinion/90 - 2 * (modul + c);    // Bevel Diameter on the Large Sphere 
    rf_pinion = df_pinion / 2;                              // Root Cone Radius on the Large Sphere
    delta_f_pinion = rf_pinion/(pi*rg) * 180;               // Tip Cone Angle
    rkf_pinion = rg*sin(delta_f_pinion);                    // Radius of the Cone Foot
    height_f_pinion = rg*cos(delta_f_pinion);                // Height of the Cone from the Root Cone
    
    echo("Cone Angle Gear = ", delta_gear);
    echo("Cone Angle Pinion = ", delta_pinion);
 
    df_gear = pi*rg*delta_gear/90 - 2 * (modul + c);          // Bevel Diameter on the Large Sphere 
    rf_gear = df_gear / 2;                                    // Root Cone Radius on the Large Sphere
    delta_f_gear = rf_gear/(pi*rg) * 180;                     // Tip Cone Angle
    rkf_gear = rg*sin(delta_f_gear);                          // Radius of the Cone Foot
    height_f_gear = rg*cos(delta_f_gear);                      // Height of the Cone from the Root Cone

    echo("Gear Height = ", height_f_gear);
    echo("Pinion Height = ", height_f_pinion);
    
    rotate = is_even(pinion_teeth);
    
    // Gear
    rotate([0,0,180*(1-clearance)/gear_teeth*rotate])
        bevel_herringbone_gear(modul, gear_teeth, delta_gear, tooth_width, gear_bore, pressure_angle, helix_angle);
    
    // Pinion
    if (together_built)
        translate([-height_f_pinion*cos(90-axis_angle),0,height_f_gear-height_f_pinion*sin(90-axis_angle)])
            rotate([0,axis_angle,0])
                bevel_herringbone_gear(modul, pinion_teeth, delta_pinion, tooth_width, pinion_bore, pressure_angle, -helix_angle);
    else
        translate([rkf_pinion*2+modul+rkf_gear,0,0])
            bevel_herringbone_gear(modul, pinion_teeth, delta_pinion, tooth_width, pinion_bore, pressure_angle, -helix_angle);

}

/*
Archimedean screw.
modul = Height of the Screw Head over the Part Cylinder
thread_starts = Number of Starts (Threads) of the Worm
length = Length of the Worm
bore = Diameter of the Center Hole
pressure_angle = Pressure Angle, Standard = 20° according to DIN 867. Should not exceed 45°.
lead_angle = Lead Angle of the Worm, corresponds to 90° minus Helix Angle. Positive Lead Angle = clockwise.
together_built = Components assembled for Construction or separated for 3D-Printing */
module worm(modul, thread_starts, length, bore, pressure_angle=20, lead_angle, together_built=true){

    // Dimension Calculations
    c = modul / 6;                                              // Tip Clearance
    r = modul*thread_starts/(2*sin(lead_angle));                // Part-Cylinder Radius
    rf = r - modul - c;                                         // Root-Cylinder Radius
    a = modul*thread_starts/(90*tan(pressure_angle));               // Spiralparameter
    tau_max = 180/thread_starts*tan(pressure_angle);                // Angle from Foot to Tip in the Normal Plane
    gamma = -rad*length/((rf+modul+c)*tan(lead_angle));    // Torsion Angle for Extrusion
    
    step = tau_max/16;
    
    // Drawing: Extrude with a Twist a Surface enclosed by two Archimedean Spirals
    if (together_built) {
        rotate([0,0,tau_max]){
            linear_extrude(height = length, center = false, convexity = 10, twist = gamma){
                difference(){
                    union(){
                        for(i=[0:1:thread_starts-1]){
                            polygon(
                                concat(                         
                                    [[0,0]],
                                    
                                    // rising Tooth Flank
                                    [for (tau = [0:step:tau_max])
                                        polar_to_cartesian([spiral(a, rf, tau), tau+i*(360/thread_starts)])],
                                        
                                    // Tooth Tip
                                    [for (tau = [tau_max:step:180/thread_starts])
                                        polar_to_cartesian([spiral(a, rf, tau_max), tau+i*(360/thread_starts)])],
                                    
                                    // descending Tooth Flank
                                    [for (tau = [180/thread_starts:step:(180/thread_starts+tau_max)])
                                        polar_to_cartesian([spiral(a, rf, 180/thread_starts+tau_max-tau), tau+i*(360/thread_starts)])]
                                )
                            );
                        }
                        circle(rf);
                    }
                    circle(bore/2); // Mittelbohrung
                }
            }
        }
    }
    else {
        difference(){
            union(){
                translate([1,r*1.5,0]){
                    rotate([90,0,90])
                        worm(modul, thread_starts, length, bore, pressure_angle, lead_angle, together_built=true);
                }
                translate([length+1,-r*1.5,0]){
                    rotate([90,0,-90])
                        worm(modul, thread_starts, length, bore, pressure_angle, lead_angle, together_built=true);
                    }
                }
            translate([length/2+1,0,-(r+modul+1)/2]){
                    cube([length+2,3*r+2*(r+modul+1),r+modul+1], center = true);
                }
        }
    }
}

/*
Calculates a worm wheel set. The worm wheel is an ordinary spur gear without globoidgeometry.
modul = Height of the screw head above the partial cylinder or the tooth head above the pitch circle
tooth_number = Number of wheel teeth
thread_starts = Number of gears (teeth) of the screw
width = tooth_width
length = Length of the Worm
worm_bore = Diameter of the Center Hole of the Worm
gear_bore = Diameter of the Center Hole of the Spur Gear
pressure_angle = Pressure Angle, Standard = 20° according to DIN 867. Should not exceed 45°.
lead_angle = Pitch angle of the worm corresponds to 90 ° bevel angle. Positive slope angle = clockwise.
optimized = Holes for material / weight savings
together_built =  Components assembled for construction or apart for 3D printing */
module worm_gear(modul, tooth_number, thread_starts, width, length, worm_bore, gear_bore, pressure_angle=20, lead_angle, optimized=true, together_built=true, show_spur=1, show_worm=1){
    
    c = modul / 6;                                              // Tip Clearance
    r_worm = modul*thread_starts/(2*sin(lead_angle));       // Worm Part-Cylinder Radius
    r_gear = modul*tooth_number/2;                                   // Spur Gear Part-Cone Radius
    rf_worm = r_worm - modul - c;                       // Root-Cylinder Radius
    gamma = -90*width*sin(lead_angle)/(pi*r_gear);         // Spur Gear Rotation Angle
    tooth_distance = modul*pi/cos(lead_angle);                // Tooth Spacing in Transverse Section
    x = is_even(thread_starts)? 0.5 : 1;

    if (together_built) {
        if(show_worm)
        translate([r_worm,(ceil(length/(2*tooth_distance))-x)*tooth_distance,0])
            rotate([90,180/thread_starts,0])
                worm(modul, thread_starts, length, worm_bore, pressure_angle, lead_angle, together_built);

        if(show_spur)
        translate([-r_gear,0,-width/2])
            rotate([0,0,gamma])
                spur_gear (modul, tooth_number, width, gear_bore, pressure_angle, -lead_angle, optimized);
    }
    else {  
        if(show_worm)
        worm(modul, thread_starts, length, worm_bore, pressure_angle, lead_angle, together_built);

        if(show_spur)
        translate([-2*r_gear,0,0])
            spur_gear (modul, tooth_number, width, gear_bore, pressure_angle, -lead_angle, optimized);
    }
}

//rack(modul=1, length=30, height=5, width=10, pressure_angle=20, helix_angle=20);

herringbone_rack(modul=1, length=60, height=5, width=10, pressure_angle=20, helix_angle=45);

//spur_gear (modul=1, tooth_number=30, width=5, bore=4, pressure_angle=20, helix_angle=20, optimized=true);

//herringbone_gear (modul=1, tooth_number=30, width=5, bore=4, pressure_angle=20, helix_angle=30, optimized=true);

//rack_and_pinion (modul=1, rack_length=50, gear_teeth=30, rack_height=4, gear_bore=4, width=5, pressure_angle=20, helix_angle=0, together_built=true, optimized=true);

//ring_gear (modul=1, tooth_number=30, width=5, rim_width=3, pressure_angle=20, helix_angle=20);

// herringbone_ring_gear (modul=1, tooth_number=30, width=5, rim_width=3, pressure_angle=20, helix_angle=30);

//planetary_gear(modul=1, sun_teeth=16, planet_teeth=9, number_planets=5, width=5, rim_width=3, bore=4, pressure_angle=20, helix_angle=30, together_built=true, optimized=true);

//bevel_gear(modul=1, tooth_number=30,  partial_cone_angle=45, tooth_width=5, bore=4, pressure_angle=20, helix_angle=20);

// bevel_herringbone_gear(modul=1, tooth_number=30, partial_cone_angle=45, tooth_width=5, bore=4, pressure_angle=20, helix_angle=30);

// bevel_gear_pair(modul=1, gear_teeth=30, pinion_teeth=11, axis_angle=100, tooth_width=5, bore=4, pressure_angle = 20, helix_angle=20, together_built=true);

// bevel_herringbone_gear_pair(modul=1, gear_teeth=30, pinion_teeth=11, axis_angle=100, tooth_width=5, bore=4, pressure_angle = 20, helix_angle=30, together_built=true);

// worm(modul=1, thread_starts=2, length=15, bore=4, pressure_angle=20, lead_angle=10, together_built=true);

// worm_gear(modul=1, tooth_number=30, thread_starts=2, width=8, length=20, worm_bore=4, gear_bore=4, pressure_angle=20, lead_angle=10, optimized=1, together_built=1, show_spur=1, show_worm=1);
